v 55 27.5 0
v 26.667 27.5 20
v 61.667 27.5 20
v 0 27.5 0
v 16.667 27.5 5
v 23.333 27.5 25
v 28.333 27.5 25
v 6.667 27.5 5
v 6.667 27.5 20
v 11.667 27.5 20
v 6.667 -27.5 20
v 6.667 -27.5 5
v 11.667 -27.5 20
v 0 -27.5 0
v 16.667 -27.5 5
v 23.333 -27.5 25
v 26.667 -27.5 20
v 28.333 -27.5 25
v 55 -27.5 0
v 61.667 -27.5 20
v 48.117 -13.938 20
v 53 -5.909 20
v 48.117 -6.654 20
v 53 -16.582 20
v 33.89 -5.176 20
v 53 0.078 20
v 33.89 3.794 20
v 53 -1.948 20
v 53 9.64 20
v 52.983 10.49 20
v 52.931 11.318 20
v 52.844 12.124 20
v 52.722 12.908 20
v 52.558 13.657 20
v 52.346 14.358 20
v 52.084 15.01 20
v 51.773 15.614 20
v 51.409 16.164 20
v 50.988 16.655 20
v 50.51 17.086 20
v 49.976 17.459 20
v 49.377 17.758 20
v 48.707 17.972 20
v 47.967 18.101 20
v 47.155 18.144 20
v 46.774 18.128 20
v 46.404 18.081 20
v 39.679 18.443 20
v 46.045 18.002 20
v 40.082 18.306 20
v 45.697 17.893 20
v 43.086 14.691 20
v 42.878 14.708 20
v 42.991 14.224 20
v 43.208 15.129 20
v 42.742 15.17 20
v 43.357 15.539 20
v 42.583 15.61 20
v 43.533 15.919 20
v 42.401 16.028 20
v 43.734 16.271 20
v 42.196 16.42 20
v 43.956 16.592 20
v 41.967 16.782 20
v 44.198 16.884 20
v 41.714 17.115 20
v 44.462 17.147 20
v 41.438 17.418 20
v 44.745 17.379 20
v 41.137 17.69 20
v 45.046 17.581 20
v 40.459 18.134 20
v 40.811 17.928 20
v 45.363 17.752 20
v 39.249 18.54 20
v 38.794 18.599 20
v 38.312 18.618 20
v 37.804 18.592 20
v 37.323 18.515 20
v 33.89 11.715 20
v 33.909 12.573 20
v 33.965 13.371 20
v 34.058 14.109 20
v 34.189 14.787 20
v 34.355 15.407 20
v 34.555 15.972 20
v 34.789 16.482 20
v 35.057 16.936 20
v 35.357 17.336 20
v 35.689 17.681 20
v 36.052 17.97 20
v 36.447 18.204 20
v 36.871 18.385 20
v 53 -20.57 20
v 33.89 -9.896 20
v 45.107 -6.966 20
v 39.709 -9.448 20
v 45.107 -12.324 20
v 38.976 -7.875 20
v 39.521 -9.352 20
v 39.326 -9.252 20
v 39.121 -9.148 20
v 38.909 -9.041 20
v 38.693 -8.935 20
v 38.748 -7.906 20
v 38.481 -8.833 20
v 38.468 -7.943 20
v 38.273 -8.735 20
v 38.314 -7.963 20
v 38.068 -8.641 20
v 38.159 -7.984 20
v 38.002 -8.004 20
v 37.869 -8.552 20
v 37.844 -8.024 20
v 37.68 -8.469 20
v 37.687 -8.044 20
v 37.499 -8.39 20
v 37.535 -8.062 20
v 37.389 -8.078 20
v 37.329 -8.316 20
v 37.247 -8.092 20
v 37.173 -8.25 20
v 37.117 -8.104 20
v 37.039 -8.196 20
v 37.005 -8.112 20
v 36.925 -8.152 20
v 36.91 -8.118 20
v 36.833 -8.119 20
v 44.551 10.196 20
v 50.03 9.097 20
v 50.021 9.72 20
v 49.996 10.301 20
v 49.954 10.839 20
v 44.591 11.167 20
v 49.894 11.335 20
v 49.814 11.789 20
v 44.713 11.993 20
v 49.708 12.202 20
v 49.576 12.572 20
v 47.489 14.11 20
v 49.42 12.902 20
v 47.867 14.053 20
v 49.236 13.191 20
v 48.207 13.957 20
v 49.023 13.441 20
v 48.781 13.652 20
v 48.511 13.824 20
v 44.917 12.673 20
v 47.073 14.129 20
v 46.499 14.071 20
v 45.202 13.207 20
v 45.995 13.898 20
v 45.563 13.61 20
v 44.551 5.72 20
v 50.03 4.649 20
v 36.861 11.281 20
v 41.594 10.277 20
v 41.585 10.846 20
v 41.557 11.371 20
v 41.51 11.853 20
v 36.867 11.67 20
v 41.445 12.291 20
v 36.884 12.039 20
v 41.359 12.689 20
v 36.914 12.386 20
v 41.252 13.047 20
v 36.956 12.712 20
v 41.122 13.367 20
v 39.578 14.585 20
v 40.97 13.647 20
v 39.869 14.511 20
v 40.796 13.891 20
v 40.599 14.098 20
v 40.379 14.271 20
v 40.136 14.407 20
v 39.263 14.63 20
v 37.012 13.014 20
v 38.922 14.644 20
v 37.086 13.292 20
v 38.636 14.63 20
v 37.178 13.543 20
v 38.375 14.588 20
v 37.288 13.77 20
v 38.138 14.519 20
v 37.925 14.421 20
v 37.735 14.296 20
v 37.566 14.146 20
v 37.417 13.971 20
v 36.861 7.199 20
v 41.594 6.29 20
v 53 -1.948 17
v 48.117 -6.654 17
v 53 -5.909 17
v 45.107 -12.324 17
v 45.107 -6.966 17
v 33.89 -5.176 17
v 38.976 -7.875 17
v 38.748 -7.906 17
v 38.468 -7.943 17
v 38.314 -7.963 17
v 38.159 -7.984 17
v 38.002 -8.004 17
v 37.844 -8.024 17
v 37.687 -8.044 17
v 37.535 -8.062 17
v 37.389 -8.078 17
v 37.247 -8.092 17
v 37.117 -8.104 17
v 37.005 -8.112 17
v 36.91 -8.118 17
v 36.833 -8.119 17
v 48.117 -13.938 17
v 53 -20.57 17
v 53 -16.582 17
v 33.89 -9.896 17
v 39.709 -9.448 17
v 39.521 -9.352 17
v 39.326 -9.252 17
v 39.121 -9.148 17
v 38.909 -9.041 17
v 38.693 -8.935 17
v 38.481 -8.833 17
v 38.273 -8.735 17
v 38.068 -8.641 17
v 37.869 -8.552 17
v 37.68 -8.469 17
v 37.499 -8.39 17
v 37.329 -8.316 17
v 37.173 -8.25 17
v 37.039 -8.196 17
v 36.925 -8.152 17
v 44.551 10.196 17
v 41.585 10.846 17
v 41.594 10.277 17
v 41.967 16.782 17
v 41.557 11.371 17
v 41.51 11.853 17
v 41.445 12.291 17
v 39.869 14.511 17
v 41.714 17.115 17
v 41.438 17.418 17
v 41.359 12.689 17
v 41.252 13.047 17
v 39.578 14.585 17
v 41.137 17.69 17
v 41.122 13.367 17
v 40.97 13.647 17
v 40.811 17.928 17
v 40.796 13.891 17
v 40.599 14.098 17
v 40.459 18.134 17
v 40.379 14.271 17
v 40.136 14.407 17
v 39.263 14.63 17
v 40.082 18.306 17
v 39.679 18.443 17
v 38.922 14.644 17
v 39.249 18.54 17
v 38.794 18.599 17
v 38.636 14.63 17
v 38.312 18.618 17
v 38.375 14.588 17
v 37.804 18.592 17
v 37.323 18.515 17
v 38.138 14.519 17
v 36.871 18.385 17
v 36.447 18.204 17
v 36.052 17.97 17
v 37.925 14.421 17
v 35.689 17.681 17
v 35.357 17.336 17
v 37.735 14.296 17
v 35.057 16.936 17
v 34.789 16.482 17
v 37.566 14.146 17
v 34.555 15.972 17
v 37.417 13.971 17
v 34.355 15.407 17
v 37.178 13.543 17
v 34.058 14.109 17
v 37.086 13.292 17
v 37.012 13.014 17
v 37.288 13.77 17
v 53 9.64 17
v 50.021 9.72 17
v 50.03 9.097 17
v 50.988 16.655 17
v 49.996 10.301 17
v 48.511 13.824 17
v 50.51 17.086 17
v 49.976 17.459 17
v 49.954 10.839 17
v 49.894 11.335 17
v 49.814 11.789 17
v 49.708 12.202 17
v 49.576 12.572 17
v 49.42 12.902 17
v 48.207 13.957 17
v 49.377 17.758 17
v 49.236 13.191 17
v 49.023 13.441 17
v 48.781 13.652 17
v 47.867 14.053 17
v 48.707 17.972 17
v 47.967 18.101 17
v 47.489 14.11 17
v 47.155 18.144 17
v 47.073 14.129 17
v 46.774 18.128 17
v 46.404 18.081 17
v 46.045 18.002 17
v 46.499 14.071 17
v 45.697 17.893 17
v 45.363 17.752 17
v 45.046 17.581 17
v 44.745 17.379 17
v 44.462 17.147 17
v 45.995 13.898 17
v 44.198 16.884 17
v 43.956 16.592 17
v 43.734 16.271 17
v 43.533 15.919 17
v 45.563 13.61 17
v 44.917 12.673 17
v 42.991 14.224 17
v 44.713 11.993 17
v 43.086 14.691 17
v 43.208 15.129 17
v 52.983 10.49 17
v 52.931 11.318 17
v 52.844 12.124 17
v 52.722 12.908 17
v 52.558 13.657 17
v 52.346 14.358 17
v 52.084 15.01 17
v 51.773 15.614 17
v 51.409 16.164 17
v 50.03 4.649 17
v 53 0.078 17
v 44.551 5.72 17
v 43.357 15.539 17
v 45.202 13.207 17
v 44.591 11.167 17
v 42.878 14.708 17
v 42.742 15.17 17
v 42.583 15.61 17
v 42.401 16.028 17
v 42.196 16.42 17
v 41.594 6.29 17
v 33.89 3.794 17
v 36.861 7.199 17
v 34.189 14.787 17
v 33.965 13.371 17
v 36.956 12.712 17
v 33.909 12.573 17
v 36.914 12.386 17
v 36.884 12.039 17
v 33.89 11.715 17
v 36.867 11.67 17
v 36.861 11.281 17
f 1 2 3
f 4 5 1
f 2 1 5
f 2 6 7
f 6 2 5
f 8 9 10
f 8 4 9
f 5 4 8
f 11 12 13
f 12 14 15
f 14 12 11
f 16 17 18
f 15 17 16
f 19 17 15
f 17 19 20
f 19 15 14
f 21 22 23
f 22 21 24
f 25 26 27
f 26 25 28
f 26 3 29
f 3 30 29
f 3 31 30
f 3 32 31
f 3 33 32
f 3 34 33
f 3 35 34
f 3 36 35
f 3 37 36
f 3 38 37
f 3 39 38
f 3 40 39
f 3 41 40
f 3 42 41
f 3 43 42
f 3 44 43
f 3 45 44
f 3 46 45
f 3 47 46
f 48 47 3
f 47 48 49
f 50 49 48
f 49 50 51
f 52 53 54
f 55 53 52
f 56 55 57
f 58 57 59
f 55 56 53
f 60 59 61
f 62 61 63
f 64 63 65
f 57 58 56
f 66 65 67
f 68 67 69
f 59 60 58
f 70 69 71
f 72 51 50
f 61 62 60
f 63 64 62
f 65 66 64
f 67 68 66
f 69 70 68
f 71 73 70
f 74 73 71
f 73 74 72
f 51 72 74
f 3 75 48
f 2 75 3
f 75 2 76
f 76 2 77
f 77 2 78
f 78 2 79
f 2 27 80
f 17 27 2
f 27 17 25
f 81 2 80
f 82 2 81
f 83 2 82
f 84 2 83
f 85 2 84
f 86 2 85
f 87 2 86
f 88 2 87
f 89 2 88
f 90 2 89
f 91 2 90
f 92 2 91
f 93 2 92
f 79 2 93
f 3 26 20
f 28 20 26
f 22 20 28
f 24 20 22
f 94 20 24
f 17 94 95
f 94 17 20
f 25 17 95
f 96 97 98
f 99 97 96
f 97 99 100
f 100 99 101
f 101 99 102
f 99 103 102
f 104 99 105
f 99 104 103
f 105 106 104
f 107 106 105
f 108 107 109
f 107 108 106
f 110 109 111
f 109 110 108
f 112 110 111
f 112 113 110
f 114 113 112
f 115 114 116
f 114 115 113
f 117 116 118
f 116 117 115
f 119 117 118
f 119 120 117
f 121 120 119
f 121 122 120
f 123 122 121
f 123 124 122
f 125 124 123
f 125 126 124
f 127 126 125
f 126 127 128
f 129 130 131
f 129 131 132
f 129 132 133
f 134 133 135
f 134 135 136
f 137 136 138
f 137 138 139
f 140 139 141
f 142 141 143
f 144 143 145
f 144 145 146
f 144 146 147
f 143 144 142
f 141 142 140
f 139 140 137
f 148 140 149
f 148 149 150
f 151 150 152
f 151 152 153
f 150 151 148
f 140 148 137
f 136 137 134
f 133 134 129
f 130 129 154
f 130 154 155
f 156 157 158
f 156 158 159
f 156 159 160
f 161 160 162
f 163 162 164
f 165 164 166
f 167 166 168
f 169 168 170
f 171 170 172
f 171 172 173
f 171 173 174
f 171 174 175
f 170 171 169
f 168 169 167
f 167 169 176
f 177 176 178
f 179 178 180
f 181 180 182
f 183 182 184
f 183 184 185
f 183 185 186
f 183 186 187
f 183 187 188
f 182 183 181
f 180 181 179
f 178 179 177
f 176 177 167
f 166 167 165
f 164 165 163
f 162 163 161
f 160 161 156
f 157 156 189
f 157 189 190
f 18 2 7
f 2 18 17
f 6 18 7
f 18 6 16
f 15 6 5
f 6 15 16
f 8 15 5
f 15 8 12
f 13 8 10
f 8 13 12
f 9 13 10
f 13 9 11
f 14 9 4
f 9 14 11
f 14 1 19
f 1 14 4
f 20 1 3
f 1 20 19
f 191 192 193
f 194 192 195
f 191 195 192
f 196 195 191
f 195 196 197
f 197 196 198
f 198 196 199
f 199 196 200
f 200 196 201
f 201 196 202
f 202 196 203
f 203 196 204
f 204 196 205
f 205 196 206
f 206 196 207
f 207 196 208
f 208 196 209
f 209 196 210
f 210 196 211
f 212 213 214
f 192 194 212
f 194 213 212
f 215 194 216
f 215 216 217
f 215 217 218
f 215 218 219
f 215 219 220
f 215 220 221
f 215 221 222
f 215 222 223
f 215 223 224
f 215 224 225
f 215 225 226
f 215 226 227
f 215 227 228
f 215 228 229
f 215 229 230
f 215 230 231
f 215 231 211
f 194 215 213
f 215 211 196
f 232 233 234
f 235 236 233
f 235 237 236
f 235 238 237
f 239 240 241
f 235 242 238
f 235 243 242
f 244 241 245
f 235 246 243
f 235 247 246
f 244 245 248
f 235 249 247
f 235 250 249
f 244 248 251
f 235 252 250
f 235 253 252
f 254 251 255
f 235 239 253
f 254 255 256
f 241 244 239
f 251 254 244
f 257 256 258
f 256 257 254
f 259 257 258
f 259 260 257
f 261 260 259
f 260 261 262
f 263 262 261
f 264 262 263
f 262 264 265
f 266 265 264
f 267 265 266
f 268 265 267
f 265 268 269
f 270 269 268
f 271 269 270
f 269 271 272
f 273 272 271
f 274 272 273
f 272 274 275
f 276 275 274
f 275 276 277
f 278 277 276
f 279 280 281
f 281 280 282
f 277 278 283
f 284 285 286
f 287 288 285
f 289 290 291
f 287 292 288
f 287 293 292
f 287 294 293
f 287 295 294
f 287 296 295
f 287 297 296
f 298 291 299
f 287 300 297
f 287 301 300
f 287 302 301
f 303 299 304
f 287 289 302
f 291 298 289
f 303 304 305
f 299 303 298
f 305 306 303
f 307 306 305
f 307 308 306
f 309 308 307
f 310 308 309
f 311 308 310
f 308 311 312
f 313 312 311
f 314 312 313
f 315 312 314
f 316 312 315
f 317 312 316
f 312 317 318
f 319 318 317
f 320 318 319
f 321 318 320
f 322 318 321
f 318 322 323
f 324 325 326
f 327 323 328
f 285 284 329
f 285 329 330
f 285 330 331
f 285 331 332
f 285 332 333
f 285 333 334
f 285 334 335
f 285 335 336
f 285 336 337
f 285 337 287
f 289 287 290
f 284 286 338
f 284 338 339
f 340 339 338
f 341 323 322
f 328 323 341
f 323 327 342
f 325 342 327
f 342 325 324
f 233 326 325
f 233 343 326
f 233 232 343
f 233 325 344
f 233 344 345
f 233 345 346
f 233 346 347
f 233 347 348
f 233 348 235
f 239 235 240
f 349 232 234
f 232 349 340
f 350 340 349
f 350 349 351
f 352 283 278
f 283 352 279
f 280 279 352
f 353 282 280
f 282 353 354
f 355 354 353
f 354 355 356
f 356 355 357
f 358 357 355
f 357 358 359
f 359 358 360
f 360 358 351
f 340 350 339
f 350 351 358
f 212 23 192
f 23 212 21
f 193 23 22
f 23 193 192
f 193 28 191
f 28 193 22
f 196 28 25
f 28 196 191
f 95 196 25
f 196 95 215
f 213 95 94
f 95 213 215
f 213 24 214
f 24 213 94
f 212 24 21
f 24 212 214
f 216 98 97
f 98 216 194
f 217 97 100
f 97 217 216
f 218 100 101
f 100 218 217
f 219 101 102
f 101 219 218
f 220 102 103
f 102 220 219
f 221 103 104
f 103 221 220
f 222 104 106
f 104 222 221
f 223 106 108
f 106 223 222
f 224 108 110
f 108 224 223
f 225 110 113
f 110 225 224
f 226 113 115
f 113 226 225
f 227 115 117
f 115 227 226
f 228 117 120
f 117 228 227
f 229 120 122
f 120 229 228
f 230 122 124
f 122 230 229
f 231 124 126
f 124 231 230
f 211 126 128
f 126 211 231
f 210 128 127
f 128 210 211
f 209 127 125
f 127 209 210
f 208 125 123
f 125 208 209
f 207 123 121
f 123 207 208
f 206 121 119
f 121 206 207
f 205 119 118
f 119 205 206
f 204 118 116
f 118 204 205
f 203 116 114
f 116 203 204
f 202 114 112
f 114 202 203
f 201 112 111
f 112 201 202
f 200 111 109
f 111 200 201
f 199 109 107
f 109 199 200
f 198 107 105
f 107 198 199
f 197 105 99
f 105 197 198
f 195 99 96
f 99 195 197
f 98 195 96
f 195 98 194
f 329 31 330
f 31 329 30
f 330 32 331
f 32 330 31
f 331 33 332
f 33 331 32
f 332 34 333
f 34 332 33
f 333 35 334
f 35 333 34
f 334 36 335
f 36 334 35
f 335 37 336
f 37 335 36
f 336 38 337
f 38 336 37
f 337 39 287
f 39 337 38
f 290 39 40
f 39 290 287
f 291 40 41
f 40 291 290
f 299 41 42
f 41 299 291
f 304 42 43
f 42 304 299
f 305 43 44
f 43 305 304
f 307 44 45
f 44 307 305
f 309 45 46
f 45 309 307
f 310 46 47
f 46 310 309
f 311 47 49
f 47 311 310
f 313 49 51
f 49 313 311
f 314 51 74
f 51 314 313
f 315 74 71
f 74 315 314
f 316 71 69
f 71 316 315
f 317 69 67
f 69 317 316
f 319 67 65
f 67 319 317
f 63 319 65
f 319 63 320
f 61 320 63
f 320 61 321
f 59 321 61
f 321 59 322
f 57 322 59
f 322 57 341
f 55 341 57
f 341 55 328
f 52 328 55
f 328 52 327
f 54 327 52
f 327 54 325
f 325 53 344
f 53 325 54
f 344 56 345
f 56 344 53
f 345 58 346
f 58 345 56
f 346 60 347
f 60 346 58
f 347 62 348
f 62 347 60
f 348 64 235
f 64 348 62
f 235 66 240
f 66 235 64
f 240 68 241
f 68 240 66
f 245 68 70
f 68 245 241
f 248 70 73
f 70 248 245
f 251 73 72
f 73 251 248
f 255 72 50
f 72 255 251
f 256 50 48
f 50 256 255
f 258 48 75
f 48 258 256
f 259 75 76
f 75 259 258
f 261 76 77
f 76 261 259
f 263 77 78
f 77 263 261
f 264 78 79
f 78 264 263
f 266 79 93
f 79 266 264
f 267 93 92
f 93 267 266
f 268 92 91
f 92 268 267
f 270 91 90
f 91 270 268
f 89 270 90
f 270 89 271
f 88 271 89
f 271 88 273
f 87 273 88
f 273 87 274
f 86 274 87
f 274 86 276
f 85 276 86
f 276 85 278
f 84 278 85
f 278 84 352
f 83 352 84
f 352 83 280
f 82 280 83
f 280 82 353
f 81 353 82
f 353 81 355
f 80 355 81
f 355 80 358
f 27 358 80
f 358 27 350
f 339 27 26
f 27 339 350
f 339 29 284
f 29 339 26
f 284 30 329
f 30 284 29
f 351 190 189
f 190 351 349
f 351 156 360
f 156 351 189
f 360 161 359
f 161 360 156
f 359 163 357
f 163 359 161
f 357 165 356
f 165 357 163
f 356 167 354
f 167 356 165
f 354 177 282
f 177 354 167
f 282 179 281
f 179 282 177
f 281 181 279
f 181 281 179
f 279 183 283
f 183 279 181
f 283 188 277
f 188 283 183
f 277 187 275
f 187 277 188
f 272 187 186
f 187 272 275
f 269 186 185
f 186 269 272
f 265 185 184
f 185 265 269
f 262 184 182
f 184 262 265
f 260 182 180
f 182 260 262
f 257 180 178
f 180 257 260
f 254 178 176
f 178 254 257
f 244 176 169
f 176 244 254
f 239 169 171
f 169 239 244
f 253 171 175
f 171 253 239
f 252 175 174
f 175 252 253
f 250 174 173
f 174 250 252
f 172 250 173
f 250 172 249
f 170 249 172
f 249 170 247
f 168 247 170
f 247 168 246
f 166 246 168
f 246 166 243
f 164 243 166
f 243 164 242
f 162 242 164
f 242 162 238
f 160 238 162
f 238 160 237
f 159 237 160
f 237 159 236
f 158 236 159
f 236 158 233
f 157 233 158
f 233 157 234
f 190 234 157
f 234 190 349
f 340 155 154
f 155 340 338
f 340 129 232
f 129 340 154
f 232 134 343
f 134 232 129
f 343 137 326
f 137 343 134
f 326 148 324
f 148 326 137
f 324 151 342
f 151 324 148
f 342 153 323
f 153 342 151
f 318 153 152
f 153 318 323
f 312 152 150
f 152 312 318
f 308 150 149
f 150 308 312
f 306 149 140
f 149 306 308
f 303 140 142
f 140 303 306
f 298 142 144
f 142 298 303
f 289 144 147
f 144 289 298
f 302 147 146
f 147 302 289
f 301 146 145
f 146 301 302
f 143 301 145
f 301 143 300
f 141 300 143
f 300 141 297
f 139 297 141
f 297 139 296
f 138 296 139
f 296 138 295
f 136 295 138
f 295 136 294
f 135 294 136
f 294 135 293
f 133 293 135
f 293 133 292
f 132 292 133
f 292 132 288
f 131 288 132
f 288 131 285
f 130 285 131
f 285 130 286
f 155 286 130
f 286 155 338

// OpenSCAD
//parameters
height = 20;
x = 55;
y = 55;
vertical_shift = 5; // the value can be between 0 and 'height'
tilting = 3; 
thickness = 5;
phone_thicness = 10;

text = "AB";
text_size = 20;
text_depth = 3;
position_of_text_x = 53;
position_of_text_y = -20;
position_of_text_z = 19;
//body
  rotate([90,0,0])
  difference() {
    // Extrudes the body of the model from the polygon shape
    linear_extrude(height = y, center = true, convexity = 10,  slices = 20, scale = 1.0) {polygon(points=[[0,0],[x,0],[x+height/tilting,height],[phone_thicness+thickness+height/tilting-(height-vertical_shift)/tilting+height/tilting+thickness-(vertical_shift)/tilting,height],[phone_thicness+thickness+height/tilting-(height-vertical_shift)/tilting+height/tilting+thickness,vertical_shift+height], [phone_thicness+thickness+height/tilting-(height-vertical_shift)/tilting+height/tilting,vertical_shift+height],[phone_thicness+thickness+height/tilting-(height-vertical_shift)/tilting,vertical_shift], [thickness+height/tilting-(height-vertical_shift)/tilting,vertical_shift], [thickness+height/tilting,height], [height/tilting,height]]);}
    // Imprints text 'AB' on the top surface of the model
    rotate([0,90,90]) translate([position_of_text_y,-position_of_text_x,height-text_depth])
    linear_extrude(height = text_depth,   convexity = 10,  slices = 20, scale = 1.0) {text(text, font = "Liberation Sans:style=Bold Italic", size = text_size);}  
}
